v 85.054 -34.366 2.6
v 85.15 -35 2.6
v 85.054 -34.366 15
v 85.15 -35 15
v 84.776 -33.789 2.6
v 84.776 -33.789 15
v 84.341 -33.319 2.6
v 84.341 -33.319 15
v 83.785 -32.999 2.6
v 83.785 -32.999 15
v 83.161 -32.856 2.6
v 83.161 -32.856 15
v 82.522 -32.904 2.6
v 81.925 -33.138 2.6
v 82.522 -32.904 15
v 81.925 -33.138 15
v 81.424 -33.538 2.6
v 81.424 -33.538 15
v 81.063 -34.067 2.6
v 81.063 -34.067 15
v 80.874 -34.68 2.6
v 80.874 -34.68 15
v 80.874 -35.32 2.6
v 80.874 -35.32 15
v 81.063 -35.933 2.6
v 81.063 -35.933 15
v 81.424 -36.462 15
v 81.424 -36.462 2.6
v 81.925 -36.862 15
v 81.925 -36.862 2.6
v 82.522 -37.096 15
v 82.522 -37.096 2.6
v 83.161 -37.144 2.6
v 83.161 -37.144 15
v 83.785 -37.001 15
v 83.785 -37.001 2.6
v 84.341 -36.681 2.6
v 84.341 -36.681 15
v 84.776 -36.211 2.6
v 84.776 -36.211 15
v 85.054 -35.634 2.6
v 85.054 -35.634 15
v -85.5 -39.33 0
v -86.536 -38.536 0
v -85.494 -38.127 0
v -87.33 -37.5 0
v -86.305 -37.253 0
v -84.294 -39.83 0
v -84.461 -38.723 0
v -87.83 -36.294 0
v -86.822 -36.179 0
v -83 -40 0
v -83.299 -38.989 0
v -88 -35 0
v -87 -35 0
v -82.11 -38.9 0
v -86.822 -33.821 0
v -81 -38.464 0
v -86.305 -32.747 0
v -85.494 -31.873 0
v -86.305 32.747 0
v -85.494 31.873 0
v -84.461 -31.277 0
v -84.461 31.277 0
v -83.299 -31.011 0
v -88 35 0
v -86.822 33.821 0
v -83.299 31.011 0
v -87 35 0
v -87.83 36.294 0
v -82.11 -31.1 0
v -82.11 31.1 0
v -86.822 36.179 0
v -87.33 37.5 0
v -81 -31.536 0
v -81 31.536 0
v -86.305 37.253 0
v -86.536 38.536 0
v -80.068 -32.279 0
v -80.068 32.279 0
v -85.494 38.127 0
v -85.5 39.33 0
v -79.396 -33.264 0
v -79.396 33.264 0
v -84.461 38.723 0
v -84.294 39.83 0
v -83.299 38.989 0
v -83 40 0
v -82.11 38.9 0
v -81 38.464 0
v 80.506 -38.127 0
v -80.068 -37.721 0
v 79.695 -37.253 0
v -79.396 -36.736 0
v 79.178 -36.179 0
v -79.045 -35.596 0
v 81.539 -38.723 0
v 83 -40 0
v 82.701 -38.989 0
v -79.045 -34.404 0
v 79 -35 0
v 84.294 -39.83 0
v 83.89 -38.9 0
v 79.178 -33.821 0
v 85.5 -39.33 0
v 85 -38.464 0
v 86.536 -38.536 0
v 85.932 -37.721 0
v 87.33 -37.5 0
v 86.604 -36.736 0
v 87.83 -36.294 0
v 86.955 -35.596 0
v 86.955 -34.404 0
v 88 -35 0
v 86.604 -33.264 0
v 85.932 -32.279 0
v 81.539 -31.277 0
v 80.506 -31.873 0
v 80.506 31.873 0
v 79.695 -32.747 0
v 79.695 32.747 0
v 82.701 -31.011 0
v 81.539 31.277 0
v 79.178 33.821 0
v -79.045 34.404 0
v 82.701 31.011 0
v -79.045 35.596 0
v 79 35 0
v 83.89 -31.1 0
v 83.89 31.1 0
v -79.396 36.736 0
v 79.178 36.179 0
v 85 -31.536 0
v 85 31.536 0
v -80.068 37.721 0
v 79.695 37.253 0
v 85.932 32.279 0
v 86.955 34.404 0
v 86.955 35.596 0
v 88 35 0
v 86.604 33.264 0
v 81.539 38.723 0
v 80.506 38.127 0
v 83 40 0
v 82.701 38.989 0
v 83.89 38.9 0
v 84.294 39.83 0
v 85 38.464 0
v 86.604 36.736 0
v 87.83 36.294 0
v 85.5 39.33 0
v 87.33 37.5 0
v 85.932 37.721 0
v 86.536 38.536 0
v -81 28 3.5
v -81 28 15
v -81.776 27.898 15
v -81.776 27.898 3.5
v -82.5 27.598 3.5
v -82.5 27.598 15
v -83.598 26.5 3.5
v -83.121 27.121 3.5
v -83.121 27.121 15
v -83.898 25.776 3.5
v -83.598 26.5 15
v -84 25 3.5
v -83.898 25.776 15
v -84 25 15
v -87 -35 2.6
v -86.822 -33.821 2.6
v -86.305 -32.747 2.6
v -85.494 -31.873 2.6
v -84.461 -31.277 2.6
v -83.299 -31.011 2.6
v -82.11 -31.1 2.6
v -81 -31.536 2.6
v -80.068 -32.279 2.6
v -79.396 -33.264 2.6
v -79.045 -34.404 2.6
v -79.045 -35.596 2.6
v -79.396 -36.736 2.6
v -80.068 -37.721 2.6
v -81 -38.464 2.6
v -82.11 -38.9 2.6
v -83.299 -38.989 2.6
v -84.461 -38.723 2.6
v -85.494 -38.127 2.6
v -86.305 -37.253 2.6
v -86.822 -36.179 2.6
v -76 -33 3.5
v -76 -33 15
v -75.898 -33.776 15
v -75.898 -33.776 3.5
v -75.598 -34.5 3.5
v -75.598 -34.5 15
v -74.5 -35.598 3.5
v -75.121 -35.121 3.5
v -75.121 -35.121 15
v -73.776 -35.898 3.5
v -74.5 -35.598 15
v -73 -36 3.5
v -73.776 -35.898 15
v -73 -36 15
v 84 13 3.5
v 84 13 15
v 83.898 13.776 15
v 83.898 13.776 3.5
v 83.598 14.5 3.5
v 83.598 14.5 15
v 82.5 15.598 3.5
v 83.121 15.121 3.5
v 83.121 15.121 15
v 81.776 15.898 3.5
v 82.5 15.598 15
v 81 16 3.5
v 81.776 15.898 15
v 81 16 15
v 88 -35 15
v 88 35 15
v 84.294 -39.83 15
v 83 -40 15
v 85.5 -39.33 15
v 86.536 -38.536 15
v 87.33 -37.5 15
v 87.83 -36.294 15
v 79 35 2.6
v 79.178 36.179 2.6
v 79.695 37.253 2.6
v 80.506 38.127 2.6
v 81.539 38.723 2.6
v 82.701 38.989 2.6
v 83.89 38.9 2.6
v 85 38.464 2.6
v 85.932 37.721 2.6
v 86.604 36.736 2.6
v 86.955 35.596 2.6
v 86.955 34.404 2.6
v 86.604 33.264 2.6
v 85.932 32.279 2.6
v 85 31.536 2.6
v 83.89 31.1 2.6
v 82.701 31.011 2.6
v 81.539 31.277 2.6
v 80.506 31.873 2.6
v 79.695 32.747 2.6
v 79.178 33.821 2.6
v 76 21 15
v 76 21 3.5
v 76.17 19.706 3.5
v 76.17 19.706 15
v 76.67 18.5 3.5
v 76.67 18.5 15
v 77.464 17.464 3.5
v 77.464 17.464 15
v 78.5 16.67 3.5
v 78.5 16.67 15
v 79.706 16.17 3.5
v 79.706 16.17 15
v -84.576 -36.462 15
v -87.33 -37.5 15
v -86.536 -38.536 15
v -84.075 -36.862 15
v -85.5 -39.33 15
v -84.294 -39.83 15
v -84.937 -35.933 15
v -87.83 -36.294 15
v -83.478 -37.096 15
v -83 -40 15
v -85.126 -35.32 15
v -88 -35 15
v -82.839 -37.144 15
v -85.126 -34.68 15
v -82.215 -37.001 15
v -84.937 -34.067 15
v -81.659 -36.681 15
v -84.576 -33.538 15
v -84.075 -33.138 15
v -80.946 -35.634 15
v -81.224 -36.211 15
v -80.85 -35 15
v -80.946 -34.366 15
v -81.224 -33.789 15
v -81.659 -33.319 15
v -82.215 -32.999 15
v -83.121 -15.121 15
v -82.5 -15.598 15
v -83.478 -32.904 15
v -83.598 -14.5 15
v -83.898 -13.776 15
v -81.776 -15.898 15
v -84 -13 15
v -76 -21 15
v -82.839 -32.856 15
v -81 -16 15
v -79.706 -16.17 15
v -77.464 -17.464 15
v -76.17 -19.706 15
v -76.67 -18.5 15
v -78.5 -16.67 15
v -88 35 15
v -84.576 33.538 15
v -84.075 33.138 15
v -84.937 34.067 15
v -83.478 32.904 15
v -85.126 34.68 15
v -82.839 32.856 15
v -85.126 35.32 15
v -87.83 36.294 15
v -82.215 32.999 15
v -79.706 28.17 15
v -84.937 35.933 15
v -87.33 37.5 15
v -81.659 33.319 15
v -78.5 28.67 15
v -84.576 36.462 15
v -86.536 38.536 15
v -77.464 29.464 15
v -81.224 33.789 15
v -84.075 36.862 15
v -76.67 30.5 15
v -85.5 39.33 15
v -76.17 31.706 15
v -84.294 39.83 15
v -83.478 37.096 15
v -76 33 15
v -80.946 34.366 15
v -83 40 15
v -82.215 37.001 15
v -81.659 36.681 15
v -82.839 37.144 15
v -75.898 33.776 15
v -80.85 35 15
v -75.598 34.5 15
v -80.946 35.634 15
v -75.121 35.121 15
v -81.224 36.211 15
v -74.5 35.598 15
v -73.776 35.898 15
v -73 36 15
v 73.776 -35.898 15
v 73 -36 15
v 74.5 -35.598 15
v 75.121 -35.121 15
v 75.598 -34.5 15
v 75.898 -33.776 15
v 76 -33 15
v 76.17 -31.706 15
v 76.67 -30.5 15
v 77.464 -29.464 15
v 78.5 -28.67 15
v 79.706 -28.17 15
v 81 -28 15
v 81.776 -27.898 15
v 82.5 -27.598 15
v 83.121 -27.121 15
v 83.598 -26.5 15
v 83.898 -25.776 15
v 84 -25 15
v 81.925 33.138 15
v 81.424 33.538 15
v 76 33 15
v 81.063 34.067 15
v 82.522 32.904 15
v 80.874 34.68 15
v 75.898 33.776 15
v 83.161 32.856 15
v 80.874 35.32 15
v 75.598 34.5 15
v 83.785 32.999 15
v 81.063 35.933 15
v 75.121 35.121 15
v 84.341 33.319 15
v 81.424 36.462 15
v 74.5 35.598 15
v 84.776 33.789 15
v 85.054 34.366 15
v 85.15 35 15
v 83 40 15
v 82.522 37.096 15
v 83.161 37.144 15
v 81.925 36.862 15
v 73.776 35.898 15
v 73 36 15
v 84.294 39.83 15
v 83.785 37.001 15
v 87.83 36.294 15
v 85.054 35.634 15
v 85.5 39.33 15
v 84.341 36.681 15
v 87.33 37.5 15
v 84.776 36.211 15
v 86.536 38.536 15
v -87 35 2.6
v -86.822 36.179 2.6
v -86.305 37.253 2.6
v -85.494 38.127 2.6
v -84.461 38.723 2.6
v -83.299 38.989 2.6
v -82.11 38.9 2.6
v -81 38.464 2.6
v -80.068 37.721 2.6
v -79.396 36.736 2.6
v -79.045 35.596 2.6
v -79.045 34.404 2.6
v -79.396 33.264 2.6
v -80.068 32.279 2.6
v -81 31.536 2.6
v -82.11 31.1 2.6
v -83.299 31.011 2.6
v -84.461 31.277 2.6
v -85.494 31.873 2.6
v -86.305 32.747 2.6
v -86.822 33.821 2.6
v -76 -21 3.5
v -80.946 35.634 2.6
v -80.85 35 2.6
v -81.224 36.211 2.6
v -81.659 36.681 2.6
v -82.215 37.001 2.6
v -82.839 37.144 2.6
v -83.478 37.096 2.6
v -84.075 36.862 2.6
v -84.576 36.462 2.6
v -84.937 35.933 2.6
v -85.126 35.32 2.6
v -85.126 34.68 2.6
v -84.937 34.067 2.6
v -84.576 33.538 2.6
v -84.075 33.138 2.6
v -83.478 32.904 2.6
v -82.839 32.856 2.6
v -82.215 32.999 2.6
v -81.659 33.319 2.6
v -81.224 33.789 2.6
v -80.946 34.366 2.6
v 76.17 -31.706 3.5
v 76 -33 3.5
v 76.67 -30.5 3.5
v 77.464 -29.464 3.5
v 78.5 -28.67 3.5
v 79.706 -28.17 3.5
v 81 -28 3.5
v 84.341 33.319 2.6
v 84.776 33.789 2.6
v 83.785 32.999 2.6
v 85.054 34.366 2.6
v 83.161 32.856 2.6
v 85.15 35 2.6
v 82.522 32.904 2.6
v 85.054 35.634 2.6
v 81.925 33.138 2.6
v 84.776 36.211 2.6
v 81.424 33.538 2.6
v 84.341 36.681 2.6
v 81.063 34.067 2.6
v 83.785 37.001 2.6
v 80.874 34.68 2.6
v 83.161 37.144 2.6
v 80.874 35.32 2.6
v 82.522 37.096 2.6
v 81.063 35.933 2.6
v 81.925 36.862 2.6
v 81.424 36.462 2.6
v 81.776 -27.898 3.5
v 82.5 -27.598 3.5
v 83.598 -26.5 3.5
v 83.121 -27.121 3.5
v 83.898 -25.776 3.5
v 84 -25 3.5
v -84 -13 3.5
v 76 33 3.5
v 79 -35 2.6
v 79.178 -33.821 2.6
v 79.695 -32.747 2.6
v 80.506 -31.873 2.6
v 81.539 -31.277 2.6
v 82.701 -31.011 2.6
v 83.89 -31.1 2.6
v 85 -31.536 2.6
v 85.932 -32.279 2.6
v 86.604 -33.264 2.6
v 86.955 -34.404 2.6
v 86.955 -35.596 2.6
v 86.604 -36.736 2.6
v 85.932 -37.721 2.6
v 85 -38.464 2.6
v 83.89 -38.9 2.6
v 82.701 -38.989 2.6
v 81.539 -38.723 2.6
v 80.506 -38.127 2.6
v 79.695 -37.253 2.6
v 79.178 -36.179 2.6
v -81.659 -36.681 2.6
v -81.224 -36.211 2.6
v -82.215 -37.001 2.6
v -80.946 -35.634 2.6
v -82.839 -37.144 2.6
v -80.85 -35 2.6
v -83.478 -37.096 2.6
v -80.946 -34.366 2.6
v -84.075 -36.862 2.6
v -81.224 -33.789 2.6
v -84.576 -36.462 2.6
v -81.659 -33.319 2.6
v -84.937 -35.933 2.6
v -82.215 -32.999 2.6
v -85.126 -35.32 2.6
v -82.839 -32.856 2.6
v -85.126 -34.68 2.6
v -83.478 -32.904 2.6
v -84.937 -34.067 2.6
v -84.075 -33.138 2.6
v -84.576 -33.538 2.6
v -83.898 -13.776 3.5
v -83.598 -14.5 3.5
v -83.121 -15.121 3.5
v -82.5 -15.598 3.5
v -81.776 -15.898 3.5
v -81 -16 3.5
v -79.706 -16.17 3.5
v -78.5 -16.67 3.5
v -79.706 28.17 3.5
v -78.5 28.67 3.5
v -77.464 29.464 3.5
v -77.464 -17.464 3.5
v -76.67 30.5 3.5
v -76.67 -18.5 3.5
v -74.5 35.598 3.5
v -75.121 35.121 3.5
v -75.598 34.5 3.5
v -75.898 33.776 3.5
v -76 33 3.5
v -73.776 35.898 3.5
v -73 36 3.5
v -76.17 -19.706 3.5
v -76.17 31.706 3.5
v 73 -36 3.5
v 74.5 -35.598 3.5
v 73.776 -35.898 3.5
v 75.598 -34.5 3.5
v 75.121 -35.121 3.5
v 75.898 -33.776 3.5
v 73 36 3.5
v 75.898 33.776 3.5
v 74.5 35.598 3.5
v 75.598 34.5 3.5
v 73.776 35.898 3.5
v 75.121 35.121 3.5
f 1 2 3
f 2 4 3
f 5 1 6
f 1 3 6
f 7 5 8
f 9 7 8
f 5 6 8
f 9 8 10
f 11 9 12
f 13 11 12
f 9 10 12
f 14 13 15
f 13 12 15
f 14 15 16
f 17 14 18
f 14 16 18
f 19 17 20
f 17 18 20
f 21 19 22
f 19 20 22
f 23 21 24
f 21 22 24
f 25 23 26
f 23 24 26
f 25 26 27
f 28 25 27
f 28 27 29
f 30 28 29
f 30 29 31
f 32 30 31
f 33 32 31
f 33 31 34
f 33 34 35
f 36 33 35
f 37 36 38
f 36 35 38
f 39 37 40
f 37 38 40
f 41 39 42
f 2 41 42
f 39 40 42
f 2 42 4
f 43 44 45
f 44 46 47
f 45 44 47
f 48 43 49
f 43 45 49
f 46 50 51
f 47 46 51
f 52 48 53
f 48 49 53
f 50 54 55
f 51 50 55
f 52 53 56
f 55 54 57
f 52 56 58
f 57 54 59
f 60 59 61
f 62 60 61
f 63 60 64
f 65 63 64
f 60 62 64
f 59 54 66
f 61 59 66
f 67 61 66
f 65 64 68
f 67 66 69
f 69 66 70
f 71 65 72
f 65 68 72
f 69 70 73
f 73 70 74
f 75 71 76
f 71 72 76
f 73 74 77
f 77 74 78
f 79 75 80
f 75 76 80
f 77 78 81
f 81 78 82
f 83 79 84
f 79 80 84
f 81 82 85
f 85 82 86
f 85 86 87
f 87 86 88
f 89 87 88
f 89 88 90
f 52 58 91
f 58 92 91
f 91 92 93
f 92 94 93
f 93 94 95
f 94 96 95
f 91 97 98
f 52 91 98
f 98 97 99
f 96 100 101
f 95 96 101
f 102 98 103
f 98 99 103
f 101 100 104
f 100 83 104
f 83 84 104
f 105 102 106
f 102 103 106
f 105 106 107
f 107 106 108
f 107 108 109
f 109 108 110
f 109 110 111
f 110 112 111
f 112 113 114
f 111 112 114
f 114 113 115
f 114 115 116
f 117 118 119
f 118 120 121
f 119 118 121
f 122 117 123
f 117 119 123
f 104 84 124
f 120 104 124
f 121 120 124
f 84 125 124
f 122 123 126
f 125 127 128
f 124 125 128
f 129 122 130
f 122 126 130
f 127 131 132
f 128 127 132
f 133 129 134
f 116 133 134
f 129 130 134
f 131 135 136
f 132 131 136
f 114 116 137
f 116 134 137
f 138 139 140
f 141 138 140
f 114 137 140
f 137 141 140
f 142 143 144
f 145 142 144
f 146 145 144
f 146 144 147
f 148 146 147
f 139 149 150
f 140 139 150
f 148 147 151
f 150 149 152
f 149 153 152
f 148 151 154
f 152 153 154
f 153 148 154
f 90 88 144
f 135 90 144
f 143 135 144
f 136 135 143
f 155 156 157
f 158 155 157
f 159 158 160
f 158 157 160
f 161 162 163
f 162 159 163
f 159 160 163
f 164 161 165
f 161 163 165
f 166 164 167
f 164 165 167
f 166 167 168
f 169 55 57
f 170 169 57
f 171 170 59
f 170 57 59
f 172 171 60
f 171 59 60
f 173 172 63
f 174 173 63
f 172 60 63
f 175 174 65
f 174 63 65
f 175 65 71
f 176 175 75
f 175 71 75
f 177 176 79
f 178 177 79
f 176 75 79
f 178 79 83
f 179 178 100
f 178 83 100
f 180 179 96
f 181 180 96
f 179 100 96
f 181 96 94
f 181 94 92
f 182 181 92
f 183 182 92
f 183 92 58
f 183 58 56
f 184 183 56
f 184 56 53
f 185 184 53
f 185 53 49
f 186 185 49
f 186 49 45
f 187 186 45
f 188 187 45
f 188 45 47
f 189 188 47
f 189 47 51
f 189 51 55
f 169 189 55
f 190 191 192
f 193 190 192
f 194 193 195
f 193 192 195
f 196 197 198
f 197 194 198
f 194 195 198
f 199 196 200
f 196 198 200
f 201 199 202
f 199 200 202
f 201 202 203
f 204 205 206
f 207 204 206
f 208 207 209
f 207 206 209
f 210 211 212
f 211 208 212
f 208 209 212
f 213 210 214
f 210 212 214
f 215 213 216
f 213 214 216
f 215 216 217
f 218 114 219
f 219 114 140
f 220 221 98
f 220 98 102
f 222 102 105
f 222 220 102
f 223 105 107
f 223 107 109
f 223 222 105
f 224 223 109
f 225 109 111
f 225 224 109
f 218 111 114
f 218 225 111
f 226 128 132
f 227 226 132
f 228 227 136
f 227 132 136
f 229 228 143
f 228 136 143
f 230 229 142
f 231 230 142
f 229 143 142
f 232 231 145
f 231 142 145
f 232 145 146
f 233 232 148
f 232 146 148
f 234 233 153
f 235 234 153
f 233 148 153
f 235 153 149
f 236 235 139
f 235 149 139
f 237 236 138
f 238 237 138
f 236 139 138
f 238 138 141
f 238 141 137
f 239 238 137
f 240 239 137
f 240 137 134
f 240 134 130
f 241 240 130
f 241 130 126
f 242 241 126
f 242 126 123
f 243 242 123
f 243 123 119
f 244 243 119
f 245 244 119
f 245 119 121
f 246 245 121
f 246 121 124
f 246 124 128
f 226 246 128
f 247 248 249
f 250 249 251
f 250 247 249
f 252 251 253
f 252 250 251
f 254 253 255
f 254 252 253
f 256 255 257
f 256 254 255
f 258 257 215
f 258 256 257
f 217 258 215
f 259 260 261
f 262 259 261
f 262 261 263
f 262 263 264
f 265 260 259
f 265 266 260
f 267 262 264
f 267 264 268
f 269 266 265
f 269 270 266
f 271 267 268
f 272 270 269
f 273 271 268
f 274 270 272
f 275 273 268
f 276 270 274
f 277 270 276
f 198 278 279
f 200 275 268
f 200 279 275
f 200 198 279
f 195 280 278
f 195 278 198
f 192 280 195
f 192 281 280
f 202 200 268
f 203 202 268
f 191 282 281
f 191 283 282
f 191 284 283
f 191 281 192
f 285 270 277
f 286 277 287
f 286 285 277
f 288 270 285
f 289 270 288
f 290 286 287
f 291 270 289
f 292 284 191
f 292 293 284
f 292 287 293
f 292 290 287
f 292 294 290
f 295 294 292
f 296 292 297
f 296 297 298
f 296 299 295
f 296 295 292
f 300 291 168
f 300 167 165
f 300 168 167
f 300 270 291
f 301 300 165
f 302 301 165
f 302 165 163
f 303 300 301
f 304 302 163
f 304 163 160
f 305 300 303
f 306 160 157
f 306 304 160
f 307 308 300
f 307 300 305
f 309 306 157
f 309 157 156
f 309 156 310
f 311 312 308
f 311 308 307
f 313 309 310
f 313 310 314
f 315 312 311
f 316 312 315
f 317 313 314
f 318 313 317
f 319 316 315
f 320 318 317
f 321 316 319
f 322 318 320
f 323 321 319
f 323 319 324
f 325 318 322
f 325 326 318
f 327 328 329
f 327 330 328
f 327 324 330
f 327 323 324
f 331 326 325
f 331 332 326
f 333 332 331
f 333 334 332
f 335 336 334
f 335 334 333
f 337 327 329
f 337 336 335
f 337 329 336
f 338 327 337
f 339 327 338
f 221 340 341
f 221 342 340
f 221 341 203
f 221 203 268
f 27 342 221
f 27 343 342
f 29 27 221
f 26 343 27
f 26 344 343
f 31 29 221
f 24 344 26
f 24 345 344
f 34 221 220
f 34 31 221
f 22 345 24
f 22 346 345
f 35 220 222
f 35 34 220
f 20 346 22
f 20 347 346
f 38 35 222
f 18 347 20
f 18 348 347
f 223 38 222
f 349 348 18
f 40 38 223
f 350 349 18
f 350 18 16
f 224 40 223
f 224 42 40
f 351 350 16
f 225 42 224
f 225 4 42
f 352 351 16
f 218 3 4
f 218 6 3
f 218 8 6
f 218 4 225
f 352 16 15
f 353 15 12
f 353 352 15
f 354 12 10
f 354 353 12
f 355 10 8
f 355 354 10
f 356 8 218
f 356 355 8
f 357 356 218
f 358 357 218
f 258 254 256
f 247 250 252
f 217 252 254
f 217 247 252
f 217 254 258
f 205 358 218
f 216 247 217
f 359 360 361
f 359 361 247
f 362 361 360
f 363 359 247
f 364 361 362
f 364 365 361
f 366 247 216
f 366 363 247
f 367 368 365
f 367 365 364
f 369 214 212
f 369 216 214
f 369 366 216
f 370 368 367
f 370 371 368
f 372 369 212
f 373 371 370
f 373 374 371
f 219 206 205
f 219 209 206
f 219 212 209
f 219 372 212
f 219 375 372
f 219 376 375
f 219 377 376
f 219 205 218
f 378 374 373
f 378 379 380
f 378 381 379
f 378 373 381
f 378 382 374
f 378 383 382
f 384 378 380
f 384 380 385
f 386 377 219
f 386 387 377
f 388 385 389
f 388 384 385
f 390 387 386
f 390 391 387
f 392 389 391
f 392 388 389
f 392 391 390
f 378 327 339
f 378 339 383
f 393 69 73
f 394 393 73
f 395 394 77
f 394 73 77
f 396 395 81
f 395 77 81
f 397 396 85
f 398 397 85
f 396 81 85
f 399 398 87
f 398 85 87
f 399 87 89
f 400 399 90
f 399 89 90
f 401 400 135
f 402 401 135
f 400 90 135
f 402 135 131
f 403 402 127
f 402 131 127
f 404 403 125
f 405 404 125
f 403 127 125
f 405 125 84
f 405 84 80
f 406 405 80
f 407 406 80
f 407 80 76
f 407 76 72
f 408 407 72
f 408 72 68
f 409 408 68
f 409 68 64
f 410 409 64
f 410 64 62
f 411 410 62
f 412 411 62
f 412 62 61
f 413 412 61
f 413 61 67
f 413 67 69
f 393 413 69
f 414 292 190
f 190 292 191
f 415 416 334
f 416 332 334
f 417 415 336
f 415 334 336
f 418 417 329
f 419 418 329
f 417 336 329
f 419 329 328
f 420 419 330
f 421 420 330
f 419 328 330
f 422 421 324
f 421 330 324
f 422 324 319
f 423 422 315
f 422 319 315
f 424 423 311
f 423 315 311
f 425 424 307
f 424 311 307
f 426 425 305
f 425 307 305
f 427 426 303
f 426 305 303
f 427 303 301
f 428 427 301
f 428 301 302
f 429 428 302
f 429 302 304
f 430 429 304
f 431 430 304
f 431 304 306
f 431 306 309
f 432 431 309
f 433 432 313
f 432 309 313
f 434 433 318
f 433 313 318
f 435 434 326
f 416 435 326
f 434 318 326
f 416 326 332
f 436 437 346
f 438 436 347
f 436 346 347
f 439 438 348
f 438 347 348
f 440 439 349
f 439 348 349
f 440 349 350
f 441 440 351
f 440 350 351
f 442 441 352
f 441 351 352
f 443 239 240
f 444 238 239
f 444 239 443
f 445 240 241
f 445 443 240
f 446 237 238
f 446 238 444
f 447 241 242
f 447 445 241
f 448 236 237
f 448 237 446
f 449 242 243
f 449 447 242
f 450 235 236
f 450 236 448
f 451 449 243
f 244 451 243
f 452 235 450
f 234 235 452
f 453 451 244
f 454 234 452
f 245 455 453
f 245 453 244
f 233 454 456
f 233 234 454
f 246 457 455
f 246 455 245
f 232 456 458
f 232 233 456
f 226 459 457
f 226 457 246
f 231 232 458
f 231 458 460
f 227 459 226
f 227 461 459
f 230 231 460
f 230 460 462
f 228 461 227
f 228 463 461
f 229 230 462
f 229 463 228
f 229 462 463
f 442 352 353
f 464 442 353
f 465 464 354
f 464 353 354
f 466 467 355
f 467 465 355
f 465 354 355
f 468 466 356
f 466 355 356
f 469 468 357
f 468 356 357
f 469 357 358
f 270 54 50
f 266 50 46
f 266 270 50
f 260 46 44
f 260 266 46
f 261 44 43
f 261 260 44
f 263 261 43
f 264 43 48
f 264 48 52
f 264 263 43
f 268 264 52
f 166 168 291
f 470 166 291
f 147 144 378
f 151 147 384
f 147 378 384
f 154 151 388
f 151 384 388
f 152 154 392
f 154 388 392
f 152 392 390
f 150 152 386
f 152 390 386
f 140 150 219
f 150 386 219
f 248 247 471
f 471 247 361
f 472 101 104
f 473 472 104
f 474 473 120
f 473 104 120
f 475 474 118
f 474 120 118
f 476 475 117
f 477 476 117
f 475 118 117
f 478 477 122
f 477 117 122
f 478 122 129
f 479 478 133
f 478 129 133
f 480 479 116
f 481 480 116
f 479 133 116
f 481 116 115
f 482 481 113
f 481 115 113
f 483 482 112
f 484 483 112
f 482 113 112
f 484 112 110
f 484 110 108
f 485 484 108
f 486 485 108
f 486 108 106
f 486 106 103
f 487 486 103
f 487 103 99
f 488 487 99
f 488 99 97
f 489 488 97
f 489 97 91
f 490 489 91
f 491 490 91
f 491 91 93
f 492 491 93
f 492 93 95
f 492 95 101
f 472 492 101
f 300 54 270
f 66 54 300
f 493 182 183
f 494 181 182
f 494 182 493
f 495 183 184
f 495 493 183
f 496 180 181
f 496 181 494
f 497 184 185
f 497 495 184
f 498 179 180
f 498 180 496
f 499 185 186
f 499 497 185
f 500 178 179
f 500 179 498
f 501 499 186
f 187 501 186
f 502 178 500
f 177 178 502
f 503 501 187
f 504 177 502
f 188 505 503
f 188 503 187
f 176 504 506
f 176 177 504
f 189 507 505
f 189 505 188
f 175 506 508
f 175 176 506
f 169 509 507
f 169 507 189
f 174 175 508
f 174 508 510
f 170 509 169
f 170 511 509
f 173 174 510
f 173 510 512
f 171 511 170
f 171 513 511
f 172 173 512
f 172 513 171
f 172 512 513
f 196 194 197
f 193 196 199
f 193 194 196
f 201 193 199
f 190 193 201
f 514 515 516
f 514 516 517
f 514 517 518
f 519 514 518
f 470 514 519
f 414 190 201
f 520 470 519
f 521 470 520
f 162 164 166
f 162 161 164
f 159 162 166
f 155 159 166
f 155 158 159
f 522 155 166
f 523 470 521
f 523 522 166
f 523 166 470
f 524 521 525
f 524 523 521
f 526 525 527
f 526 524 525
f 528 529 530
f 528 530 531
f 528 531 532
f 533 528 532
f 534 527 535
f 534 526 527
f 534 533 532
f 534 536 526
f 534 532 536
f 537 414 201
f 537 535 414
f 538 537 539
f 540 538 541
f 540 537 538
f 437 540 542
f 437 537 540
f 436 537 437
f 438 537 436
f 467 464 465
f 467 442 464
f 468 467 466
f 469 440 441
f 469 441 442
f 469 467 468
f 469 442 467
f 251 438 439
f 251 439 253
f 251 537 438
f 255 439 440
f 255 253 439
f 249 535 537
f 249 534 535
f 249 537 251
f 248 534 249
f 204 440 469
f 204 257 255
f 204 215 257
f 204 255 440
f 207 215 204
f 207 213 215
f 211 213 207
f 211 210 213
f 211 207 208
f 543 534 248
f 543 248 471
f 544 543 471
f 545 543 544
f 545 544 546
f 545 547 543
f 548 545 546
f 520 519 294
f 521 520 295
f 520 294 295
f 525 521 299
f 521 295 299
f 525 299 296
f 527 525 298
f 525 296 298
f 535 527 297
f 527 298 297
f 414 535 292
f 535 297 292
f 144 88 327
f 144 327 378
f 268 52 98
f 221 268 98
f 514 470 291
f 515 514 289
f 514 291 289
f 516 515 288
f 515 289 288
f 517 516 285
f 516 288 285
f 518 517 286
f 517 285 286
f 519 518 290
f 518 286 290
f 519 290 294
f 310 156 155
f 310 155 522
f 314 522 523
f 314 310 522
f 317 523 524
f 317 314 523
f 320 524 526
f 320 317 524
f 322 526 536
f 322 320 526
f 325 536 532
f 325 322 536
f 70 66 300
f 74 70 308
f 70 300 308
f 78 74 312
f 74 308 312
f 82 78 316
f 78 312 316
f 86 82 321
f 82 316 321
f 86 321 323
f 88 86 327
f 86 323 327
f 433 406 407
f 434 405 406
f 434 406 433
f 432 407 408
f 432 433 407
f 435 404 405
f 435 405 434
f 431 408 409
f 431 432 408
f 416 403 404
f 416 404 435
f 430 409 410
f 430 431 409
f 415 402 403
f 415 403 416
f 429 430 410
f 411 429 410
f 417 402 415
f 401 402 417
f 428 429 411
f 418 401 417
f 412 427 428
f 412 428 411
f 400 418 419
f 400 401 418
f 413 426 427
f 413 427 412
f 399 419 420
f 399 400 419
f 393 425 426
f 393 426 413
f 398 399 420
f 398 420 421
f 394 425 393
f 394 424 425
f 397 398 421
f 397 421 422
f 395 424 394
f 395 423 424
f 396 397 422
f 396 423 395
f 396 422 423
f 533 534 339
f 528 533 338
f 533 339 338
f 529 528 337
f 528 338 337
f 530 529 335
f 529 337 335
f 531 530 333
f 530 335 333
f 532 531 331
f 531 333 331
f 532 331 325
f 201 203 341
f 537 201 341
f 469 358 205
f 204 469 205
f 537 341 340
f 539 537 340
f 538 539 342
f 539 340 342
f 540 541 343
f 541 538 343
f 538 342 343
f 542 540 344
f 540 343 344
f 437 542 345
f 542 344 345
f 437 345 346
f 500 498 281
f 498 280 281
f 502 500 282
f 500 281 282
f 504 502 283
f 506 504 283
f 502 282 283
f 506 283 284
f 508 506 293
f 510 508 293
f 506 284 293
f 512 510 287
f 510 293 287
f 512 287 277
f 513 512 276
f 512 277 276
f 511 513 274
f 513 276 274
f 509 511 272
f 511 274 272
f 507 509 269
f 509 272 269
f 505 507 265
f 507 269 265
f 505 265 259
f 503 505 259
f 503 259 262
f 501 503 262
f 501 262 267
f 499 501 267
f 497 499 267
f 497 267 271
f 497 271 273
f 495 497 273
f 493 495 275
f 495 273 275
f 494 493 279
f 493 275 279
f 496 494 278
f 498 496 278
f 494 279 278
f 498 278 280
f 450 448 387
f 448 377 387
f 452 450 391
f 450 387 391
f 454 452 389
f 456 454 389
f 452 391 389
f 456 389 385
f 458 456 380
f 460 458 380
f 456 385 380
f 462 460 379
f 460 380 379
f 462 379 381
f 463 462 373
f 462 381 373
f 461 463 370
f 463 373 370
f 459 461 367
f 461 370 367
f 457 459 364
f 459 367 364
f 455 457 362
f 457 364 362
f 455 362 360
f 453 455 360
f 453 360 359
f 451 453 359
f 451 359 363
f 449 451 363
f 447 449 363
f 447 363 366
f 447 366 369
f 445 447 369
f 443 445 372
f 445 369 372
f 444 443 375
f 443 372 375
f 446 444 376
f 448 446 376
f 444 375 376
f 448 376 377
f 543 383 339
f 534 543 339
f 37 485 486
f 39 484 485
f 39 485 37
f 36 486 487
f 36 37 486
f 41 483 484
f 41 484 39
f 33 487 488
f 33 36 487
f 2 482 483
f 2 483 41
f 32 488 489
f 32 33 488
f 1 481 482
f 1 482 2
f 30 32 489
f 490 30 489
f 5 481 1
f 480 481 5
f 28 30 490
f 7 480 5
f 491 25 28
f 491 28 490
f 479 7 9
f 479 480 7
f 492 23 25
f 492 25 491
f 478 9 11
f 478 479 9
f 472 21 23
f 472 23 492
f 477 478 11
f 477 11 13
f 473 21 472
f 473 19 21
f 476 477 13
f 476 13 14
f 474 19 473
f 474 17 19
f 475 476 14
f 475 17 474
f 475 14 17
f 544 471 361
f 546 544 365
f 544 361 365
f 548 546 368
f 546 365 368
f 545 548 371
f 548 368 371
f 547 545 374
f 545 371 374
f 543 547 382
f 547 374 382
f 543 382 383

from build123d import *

# Parameters (mm, degrees)
SKETCH1_W                                   = 176
SKETCH1_H                                   = 80
BOSS_EXTRUDE1_DEPTH                         = 38.5
SKETCH2_W                                   = 168
SKETCH2_H                                   = 72
CUT_EXTRUDE1_DEPTH                          = 35
FILLET2_R                                   = 5
SKETCH8_W                                   = 8
SKETCH8_H                                   = 20
SKETCH8_H_2                                 = 8
BOSS_EXTRUDE2_DEPTH                         = 35
FILLET4_R                                   = 3
FILLET5_R                                   = 5
M4_TAPPED_HOLE1_D                           = 3.3
M4_TAPPED_HOLE1_DEPTH                       = 11.5
M4_TAPPED_HOLE1_TIP                         = 0.991420021
BOSS_EXTRUDE3_START                         = 1.5
BOSS_EXTRUDE3_DEPTH                         = 1.5
SKETCH25_W                                  = 192.92581759
SKETCH25_H                                  = 92.850065769
CUT_EXTRUDE4_DEPTH                          = 25
CBORE_FOR_M4_CHEESE_HEAD_SCREW2_D           = 4.3
CBORE_FOR_M4_CHEESE_HEAD_SCREW2_CBORE_D     = 8
CBORE_FOR_M4_CHEESE_HEAD_SCREW2_CBORE_DEPTH = 2.6


with BuildPart() as part:
    # Sketch1 → Boss-Extrude1 (new body)
    with BuildSketch(Plane.XY):
        Rectangle(SKETCH1_W, SKETCH1_H)
    extrude(amount=BOSS_EXTRUDE1_DEPTH)

    # Sketch2 → Cut-Extrude1 (cut)
    with BuildSketch(Plane.XY.offset(38.5)):
        Rectangle(SKETCH2_W, SKETCH2_H)
    extrude(amount=-CUT_EXTRUDE1_DEPTH, mode=Mode.SUBTRACT)

    # Fillet2
    fillet2_edges = [part.edges().sort_by_distance(p)[0] for p in [
        (-88, 40, 19.25),
        (88, 40, 19.25),
        (88, -40, 19.25),
        (-88, -40, 19.25),
    ]]
    fillet(fillet2_edges, radius=FILLET2_R)

    # Sketch8 → Boss-Extrude2 (add)
    with BuildSketch(Plane.XY.offset(3.5)):
        with Locations((80, 26)):
            Rectangle(SKETCH8_W, SKETCH8_H)
        with Locations((80, -32)):
            Rectangle(SKETCH8_W, SKETCH8_H_2)
        with Locations((-80, -26)):
            Rectangle(SKETCH8_W, SKETCH8_H)
        with Locations((-80, 32)):
            Rectangle(SKETCH8_W, SKETCH8_H_2)
    extrude(amount=BOSS_EXTRUDE2_DEPTH)

    # Fillet4
    fillet4_edges = [part.edges().sort_by_distance(p)[0] for p in [
        (76, 36, 21),
        (84, 16, 21),
        (84, -28, 21),
        (76, -36, 21),
        (-76, -36, 21),
        (-84, -16, 21),
        (-84, 28, 21),
        (-76, 36, 21),
    ]]
    fillet(fillet4_edges, radius=FILLET4_R)

    # Fillet5
    fillet5_edges = [part.edges().sort_by_distance(p)[0] for p in [
        (-76, -16, 21),
        (76, -28, 21),
        (76, 16, 21),
        (-76, 28, 21),
    ]]
    fillet(fillet5_edges, radius=FILLET5_R - 0.0001)  # a hair under: the kernel refuses the full size

    # M4 Tapped Hole1
    with Locations(Plane.XY.offset(38.5)):
        with Locations((-83, -35), (83, 35), (-83, 35), (83, -35)):
            Hole(M4_TAPPED_HOLE1_D / 2, depth=M4_TAPPED_HOLE1_DEPTH)
            with Locations((0, 0, -(M4_TAPPED_HOLE1_DEPTH + M4_TAPPED_HOLE1_TIP / 2))):  # 118° drill point
                Cone(0, M4_TAPPED_HOLE1_D / 2, M4_TAPPED_HOLE1_TIP, mode=Mode.SUBTRACT)

    # Sketch9 → Boss-Extrude3 (add)
    with BuildSketch(Plane.XY.offset(38.5).offset(BOSS_EXTRUDE3_START)):
        with BuildLine():
            Line((73, 37.5), (-73, 37.5))
            ThreePointArc((-73, 37.5), (-76.181980515, 36.181980515), (-77.5, 33))
            ThreePointArc((-77.5, 33), (-78.525126266, 30.525126266), (-81, 29.5))
            ThreePointArc((-81, 29.5), (-84.181980515, 28.181980515), (-85.5, 25))
            Line((-85.5, 25), (-85.5, -13))
            ThreePointArc((-85.5, -13), (-84.181980515, -16.181980515), (-81, -17.5))
            ThreePointArc((-81, -17.5), (-78.525126266, -18.525126266), (-77.5, -21))
            Line((-77.5, -21), (-77.5, -33))
            ThreePointArc((-77.5, -33), (-76.181980515, -36.181980515), (-73, -37.5))
            Line((-73, -37.5), (73, -37.5))
            ThreePointArc((73, -37.5), (76.181980515, -36.181980515), (77.5, -33))
            ThreePointArc((77.5, -33), (78.525126266, -30.525126266), (81, -29.5))
            ThreePointArc((81, -29.5), (84.181980515, -28.181980515), (85.5, -25))
            Line((85.5, -25), (85.5, 13))
            ThreePointArc((85.5, 13), (84.181980515, 16.181980515), (81, 17.5))
            ThreePointArc((81, 17.5), (78.525126266, 18.525126266), (77.5, 21))
            Line((77.5, 21), (77.5, 33))
            ThreePointArc((77.5, 33), (76.181980515, 36.181980515), (73, 37.5))
        make_face()
        with BuildLine():
            Line((73, 36), (-73, 36))
            ThreePointArc((-73, 36), (-75.121320344, 35.121320344), (-76, 33))
            ThreePointArc((-76, 33), (-77.464466094, 29.464466094), (-81, 28))
            ThreePointArc((-81, 28), (-83.121320344, 27.121320344), (-84, 25))
            Line((-84, 25), (-84, -13))
            ThreePointArc((-84, -13), (-83.121320344, -15.121320344), (-81, -16))
            ThreePointArc((-81, -16), (-77.464466094, -17.464466094), (-76, -21))
            Line((-76, -21), (-76, -33))
            ThreePointArc((-76, -33), (-75.121320344, -35.121320344), (-73, -36))
            Line((-73, -36), (73, -36))
            ThreePointArc((73, -36), (75.121320344, -35.121320344), (76, -33))
            ThreePointArc((76, -33), (77.464466094, -29.464466094), (81, -28))
            ThreePointArc((81, -28), (83.121320344, -27.121320344), (84, -25))
            Line((84, -25), (84, 13))
            ThreePointArc((84, 13), (83.121320344, 15.121320344), (81, 16))
            ThreePointArc((81, 16), (77.464466094, 17.464466094), (76, 21))
            Line((76, 21), (76, 33))
            ThreePointArc((76, 33), (75.121320344, 35.121320344), (73, 36))
        make_face(mode=Mode.SUBTRACT)
    extrude(amount=-BOSS_EXTRUDE3_DEPTH)

    # Sketch25 → Cut-Extrude4 (cut)
    with BuildSketch(Plane.XY.offset(40)):
        with Locations((-2.348347967, 1.083852907)):
            Rectangle(SKETCH25_W, SKETCH25_H)
    extrude(amount=-CUT_EXTRUDE4_DEPTH, mode=Mode.SUBTRACT)

    # CBORE for M4 Cheese Head Screw2 (through all)
    with Locations(Plane(origin=(0, 0, 0), x_dir=(-1, 0, 0), z_dir=(0, 0, -1))):
        with Locations((-83, 35), (83, 35), (83, -35), (-83, -35)):
            CounterBoreHole(CBORE_FOR_M4_CHEESE_HEAD_SCREW2_D / 2, CBORE_FOR_M4_CHEESE_HEAD_SCREW2_CBORE_D / 2, CBORE_FOR_M4_CHEESE_HEAD_SCREW2_CBORE_DEPTH)


solid = part.part
